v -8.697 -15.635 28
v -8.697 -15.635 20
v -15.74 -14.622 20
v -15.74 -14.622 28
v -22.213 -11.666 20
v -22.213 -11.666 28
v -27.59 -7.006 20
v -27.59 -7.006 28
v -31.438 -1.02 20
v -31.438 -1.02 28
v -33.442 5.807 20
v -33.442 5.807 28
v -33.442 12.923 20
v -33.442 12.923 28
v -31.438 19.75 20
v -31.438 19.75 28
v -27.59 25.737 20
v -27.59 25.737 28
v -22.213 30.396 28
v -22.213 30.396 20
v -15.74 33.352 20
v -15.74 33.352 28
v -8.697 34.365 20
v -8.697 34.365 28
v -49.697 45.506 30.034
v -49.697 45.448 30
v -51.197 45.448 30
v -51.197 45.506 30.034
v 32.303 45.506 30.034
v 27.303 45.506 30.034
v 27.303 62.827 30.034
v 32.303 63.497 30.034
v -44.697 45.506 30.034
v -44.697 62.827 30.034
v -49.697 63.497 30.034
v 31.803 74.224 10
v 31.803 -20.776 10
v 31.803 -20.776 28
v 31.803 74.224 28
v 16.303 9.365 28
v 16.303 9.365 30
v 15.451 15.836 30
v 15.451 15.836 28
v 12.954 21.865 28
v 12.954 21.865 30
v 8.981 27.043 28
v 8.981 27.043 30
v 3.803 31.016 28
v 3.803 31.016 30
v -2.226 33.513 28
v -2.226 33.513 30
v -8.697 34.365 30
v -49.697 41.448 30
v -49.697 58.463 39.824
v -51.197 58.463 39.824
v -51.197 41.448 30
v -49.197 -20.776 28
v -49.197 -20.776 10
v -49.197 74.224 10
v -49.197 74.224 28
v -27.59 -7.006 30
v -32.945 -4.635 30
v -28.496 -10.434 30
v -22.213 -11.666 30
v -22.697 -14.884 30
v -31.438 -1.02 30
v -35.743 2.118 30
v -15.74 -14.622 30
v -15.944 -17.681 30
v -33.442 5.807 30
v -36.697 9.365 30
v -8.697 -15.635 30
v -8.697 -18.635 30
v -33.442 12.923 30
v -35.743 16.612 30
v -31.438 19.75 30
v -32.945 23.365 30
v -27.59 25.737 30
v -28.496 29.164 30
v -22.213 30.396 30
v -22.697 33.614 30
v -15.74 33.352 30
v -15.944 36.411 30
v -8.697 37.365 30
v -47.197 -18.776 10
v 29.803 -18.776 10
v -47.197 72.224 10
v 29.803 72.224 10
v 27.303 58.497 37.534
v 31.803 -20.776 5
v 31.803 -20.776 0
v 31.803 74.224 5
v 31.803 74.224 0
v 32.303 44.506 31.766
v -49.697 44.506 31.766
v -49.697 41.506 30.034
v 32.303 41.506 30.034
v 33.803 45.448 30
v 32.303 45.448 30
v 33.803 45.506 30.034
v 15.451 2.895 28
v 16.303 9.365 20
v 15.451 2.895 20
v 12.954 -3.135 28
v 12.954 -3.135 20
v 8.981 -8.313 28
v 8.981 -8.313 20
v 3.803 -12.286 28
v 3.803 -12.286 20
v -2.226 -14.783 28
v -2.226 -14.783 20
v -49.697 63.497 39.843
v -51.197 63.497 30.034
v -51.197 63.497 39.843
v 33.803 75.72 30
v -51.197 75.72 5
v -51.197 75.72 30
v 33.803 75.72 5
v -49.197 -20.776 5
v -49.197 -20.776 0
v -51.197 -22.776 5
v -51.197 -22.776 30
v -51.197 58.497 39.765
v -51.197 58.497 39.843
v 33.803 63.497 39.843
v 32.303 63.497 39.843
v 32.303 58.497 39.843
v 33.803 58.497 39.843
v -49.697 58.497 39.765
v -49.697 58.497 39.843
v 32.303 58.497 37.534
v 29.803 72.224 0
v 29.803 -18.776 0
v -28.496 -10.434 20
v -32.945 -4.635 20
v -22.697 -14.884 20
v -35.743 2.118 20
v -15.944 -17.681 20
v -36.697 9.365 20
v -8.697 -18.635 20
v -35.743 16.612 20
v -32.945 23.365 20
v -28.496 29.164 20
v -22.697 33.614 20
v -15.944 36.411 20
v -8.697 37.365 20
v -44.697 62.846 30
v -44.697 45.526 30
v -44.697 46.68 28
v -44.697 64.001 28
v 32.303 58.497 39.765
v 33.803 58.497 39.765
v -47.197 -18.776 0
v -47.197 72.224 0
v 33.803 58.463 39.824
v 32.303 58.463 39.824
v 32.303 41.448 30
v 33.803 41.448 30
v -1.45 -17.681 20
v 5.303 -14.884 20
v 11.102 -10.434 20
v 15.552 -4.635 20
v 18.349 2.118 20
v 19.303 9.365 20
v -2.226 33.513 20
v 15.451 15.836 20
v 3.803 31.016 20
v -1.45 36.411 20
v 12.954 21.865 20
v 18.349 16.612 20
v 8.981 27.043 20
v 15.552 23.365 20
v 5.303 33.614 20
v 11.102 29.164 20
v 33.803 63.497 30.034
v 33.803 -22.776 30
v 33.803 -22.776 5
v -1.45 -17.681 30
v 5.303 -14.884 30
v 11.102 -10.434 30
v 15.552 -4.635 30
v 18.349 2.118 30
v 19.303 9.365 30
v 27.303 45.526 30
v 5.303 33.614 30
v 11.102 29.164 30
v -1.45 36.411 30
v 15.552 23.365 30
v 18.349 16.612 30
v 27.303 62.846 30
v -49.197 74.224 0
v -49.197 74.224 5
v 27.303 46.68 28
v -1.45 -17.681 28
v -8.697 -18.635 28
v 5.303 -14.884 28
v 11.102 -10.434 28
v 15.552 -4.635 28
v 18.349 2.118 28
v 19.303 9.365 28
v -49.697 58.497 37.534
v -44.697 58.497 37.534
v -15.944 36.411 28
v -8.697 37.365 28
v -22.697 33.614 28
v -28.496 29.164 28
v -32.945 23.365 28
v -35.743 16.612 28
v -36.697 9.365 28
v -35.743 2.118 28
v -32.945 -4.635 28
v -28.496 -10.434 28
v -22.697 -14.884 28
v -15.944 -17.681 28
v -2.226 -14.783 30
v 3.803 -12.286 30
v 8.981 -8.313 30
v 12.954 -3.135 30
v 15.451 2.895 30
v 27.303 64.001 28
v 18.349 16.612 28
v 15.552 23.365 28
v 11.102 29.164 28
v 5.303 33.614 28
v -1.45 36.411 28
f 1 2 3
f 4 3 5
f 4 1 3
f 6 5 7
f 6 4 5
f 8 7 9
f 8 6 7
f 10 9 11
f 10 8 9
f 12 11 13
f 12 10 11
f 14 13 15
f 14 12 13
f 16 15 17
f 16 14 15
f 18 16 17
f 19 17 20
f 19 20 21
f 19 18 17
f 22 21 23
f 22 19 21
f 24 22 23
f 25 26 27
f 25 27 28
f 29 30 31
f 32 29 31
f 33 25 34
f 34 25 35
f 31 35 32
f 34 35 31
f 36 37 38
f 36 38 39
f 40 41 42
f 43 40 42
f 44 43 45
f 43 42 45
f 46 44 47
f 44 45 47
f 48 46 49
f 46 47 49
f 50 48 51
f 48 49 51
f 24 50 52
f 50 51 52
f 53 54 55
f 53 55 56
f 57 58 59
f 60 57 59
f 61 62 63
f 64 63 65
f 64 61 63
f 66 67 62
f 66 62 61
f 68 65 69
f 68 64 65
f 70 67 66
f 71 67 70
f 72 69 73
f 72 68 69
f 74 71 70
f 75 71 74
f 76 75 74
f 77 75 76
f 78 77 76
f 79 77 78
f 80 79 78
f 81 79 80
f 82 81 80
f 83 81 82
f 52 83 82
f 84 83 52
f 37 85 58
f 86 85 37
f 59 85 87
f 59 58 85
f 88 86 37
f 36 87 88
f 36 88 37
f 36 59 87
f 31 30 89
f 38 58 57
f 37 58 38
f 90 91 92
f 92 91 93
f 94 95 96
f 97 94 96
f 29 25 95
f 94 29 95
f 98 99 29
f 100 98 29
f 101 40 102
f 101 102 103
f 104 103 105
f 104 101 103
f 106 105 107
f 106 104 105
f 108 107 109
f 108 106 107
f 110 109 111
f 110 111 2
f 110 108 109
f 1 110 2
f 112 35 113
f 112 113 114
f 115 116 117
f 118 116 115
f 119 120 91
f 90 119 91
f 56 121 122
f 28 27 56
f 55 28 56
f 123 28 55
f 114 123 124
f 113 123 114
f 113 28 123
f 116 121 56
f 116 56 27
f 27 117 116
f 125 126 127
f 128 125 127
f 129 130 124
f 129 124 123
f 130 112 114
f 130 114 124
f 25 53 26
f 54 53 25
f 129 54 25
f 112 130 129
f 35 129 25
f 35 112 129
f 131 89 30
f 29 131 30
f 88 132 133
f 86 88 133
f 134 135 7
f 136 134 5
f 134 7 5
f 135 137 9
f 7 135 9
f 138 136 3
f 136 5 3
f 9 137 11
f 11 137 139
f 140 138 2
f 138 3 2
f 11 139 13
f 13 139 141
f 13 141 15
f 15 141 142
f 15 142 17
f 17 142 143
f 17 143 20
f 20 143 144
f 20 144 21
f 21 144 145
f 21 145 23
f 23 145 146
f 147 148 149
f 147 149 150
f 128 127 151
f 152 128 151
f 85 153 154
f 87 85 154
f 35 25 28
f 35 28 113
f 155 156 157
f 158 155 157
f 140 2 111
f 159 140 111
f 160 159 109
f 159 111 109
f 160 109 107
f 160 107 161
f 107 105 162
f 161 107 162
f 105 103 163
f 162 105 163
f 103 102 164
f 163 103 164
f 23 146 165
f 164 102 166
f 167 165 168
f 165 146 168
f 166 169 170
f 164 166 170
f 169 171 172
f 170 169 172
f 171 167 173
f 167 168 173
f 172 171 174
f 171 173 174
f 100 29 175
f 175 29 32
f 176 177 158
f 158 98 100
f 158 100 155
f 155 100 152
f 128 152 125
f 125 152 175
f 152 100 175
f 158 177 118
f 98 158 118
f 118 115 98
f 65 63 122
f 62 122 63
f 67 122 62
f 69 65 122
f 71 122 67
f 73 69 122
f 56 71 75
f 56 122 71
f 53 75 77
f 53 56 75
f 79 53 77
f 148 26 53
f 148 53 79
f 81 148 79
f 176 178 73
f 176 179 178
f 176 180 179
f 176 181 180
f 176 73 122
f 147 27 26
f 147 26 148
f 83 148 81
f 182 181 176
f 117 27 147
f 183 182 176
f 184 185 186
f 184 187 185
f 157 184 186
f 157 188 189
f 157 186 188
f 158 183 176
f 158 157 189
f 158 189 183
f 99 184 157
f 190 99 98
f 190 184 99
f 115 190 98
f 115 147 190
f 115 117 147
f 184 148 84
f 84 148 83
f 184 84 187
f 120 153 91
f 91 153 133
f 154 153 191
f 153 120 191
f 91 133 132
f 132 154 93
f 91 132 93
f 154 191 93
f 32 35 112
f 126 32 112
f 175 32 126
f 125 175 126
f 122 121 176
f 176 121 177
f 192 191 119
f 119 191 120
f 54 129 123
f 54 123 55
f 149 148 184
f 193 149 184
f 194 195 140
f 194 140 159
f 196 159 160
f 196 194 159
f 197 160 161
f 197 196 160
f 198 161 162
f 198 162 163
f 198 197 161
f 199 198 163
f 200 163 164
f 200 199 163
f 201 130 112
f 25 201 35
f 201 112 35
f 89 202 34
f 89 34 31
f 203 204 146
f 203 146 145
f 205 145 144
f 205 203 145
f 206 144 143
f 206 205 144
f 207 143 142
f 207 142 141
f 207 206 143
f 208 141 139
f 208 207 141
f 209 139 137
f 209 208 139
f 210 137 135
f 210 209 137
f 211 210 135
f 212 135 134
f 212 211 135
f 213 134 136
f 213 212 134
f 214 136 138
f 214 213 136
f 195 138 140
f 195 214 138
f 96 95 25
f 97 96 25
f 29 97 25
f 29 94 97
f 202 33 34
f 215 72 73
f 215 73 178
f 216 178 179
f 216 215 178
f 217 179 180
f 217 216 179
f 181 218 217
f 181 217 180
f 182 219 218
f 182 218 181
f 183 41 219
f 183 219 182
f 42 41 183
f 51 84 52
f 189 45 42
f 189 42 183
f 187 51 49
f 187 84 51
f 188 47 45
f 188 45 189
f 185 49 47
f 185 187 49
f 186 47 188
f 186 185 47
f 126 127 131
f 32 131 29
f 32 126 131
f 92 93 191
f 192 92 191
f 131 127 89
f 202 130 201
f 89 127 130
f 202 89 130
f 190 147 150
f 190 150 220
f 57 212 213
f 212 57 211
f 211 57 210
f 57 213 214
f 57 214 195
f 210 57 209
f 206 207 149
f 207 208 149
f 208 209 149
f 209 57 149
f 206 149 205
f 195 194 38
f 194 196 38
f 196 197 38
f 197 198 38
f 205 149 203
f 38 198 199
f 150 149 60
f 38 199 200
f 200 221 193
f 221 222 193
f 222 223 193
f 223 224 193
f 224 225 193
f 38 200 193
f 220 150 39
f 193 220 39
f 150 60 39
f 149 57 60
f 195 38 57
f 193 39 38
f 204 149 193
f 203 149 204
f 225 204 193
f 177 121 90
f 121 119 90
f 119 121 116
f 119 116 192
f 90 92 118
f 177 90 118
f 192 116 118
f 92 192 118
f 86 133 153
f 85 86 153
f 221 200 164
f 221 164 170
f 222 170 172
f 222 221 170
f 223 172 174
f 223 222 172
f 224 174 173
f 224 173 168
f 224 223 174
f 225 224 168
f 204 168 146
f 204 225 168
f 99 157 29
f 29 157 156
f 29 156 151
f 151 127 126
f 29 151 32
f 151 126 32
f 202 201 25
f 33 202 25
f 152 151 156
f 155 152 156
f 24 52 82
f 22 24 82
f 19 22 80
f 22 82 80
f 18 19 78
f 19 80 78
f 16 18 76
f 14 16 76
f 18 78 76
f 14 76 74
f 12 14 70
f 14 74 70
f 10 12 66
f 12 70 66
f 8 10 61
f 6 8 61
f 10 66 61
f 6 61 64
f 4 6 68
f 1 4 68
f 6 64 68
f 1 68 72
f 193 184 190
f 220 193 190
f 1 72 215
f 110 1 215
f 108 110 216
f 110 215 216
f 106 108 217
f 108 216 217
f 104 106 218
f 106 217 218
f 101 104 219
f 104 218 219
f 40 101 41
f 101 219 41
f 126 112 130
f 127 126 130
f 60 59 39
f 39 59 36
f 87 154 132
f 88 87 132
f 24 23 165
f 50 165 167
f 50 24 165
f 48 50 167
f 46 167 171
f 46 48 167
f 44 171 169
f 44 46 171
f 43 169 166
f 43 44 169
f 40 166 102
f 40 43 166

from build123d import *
from build123d.topology import SkipClean

# Parameters (mm, degrees)
SKETCH1_W                  = 2
SKETCH1_H                  = 2
BOSS_EXTRUDE1_DEPTH        = 10
BOSS_EXTRUDE3_DEPTH        = 20
BOSS_EXTRUDE3_DEPTH_BACK   = 5
SKETCH2_W                  = 85
SKETCH2_H                  = 98.49643328
SKETCH2_W_2                = 81
SKETCH2_H_2                = 95
SKETCH3_W                  = 81
SKETCH3_H                  = 95
BOSS_EXTRUDE4_DEPTH        = 2
BOSS_EXTRUDE6_DEPTH        = 41
BOSS_EXTRUDE6_DEPTH_BACK   = 41
BOSS_EXTRUDE6_2_DEPTH      = 41
BOSS_EXTRUDE6_2_DEPTH_BACK = 41
BOSS_EXTRUDE7_DEPTH        = 1.5
SKETCH15_W                 = 72
SKETCH15_H                 = 15
CUT_EXTRUDE2_DEPTH         = 15
CUT_EXTRUDE3_DEPTH         = 10
BOSS_EXTRUDE8_DEPTH        = 10


# Read off the part's stored shape, not the designer's step: Boss-Extrude7
with BuildPart() as part:
    # Sketch1 → Boss-Extrude1 (new body)
    with BuildSketch(Plane.XY):
        Polygon((-49.196743418, -18.776119502), (-47.196743418, -18.776119502), (-47.196743418, 72.223880498), (-24.196743418, 72.223880498), (-22.196743418, 72.223880498), (29.803256582, 72.223880498), (29.803256582, 74.223880498), (-49.196743418, 74.223880498), align=None)
        Polygon((-24.196743418, -18.776119502), (-47.196743418, -18.776119502), (-47.196743418, -20.776119502), (31.803256582, -20.776119502), (31.803256582, 72.223880498), (29.803256582, 72.223880498), (29.803256582, -18.776119502), (-22.196743418, -18.776119502), align=None)
        with Locations((-48.196743418, -19.776119502)):
            Rectangle(SKETCH1_W, SKETCH1_H)
        with Locations((30.803256582, 73.223880498)):
            Rectangle(SKETCH1_W, SKETCH1_H)
    extrude(amount=BOSS_EXTRUDE1_DEPTH)

    # Sketch2 → Boss-Extrude3 (add, two sides: drawn at the far end of the back side and taken through both)
    with BuildSketch(Plane.XY.offset(10).offset(-BOSS_EXTRUDE3_DEPTH_BACK)):
        with Locations((-8.696743418, 26.472097138)):
            Rectangle(SKETCH2_W, SKETCH2_H)
        with Locations((-8.696743418, 26.723880498)):
            Rectangle(SKETCH2_W_2, SKETCH2_H_2, mode=Mode.SUBTRACT)
    extrude(amount=BOSS_EXTRUDE3_DEPTH + BOSS_EXTRUDE3_DEPTH_BACK)

    # Sketch3 → Boss-Extrude4 (add)
    with BuildSketch(Plane.XY.offset(30)):
        with Locations((-8.696743418, 26.723880498)):
            Rectangle(SKETCH3_W, SKETCH3_H)
    extrude(amount=-BOSS_EXTRUDE4_DEPTH)

    # Boss-Extrude7 outline → Boss-Extrude7 (add)
    with BuildSketch(Plane(origin=(32.303256582, 0, 0), x_dir=(0, 0, -1), z_dir=(1, 0, 0))):
        Polygon((-39.842927076, 63.496736875), (-39.842927076, 58.496736875), (-39.765386314, 58.496736875), (-39.823541886, 58.46316074), (-30, 41.448287084), (-30, 45.448287084), (-30.033525999, 45.506355818), (-30.033525999, 63.496736875), align=None)
    boss_extrude7 = extrude(amount=BOSS_EXTRUDE7_DEPTH)

    # Mirror2: Boss-Extrude7 across plane
    add(boss_extrude7.mirror(Plane(origin=(-8.696743418, 0, 0), x_dir=(0, 0, 1), z_dir=(1, 0, 0))))


with BuildPart() as body_2:
    # Sketch9 → Boss-Extrude6 (new, two sides: drawn at the far end of the back side and taken through both)
    with BuildSketch(Plane(origin=(-8.696743418, 0, 0), x_dir=(0, 0, -1), z_dir=(1, 0, 0)).offset(-BOSS_EXTRUDE6_DEPTH_BACK)):
        Polygon((-30.033525999, 45.506355818), (-30.033525999, 63.496736875), (-39.842927076, 63.496736875), (-39.842927076, 58.496736875), (-37.533525999, 58.496736875), align=None)
    extrude(amount=BOSS_EXTRUDE6_DEPTH + BOSS_EXTRUDE6_DEPTH_BACK)


with BuildPart() as body_3:
    # Sketch9 → Boss-Extrude6 2 (new, two sides: drawn at the far end of the back side and taken through both)
    with BuildSketch(Plane(origin=(-8.696743418, 0, 0), x_dir=(0, 0, -1), z_dir=(1, 0, 0)).offset(-BOSS_EXTRUDE6_2_DEPTH_BACK)):
        Polygon((-30.033525999, 41.506355818), (-30.033525999, 45.506355818), (-31.765576807, 44.506355818), align=None)
    extrude(amount=BOSS_EXTRUDE6_2_DEPTH + BOSS_EXTRUDE6_2_DEPTH_BACK)


with BuildPart() as cut_extrude2_tool:
    # Sketch15 → Cut-Extrude2 (new body)
    with BuildSketch(Plane(origin=(0, -1.628309286, 2.820314413), x_dir=(1, 0, 0), z_dir=(0, -0.5000000000000001, 0.8660254037844386))):
        with Locations((-8.696743418, 61.926423172)):
            Rectangle(SKETCH15_W, SKETCH15_H)
    extrude(amount=-CUT_EXTRUDE2_DEPTH)


with BuildPart() as part_1:
    add(part.part)

    # Cut-Extrude2: cut by cut_extrude2_tool
    add(cut_extrude2_tool.part, mode=Mode.SUBTRACT)

    # Sketch16 → Cut-Extrude3 (cut)
    with BuildSketch(Plane.XY.offset(30)):
        with BuildLine():
            ThreePointArc((-8.696743418, 34.365118158), (-33.696743418, 9.365118158), (-8.696743418, -15.634881842))
            Line((-8.696743418, -15.634881842), (-8.696743418, 34.365118158))
        make_face()
        with BuildLine():
            Line((-8.696743418, 34.365118158), (-8.696743418, -15.634881842))
            ThreePointArc((-8.696743418, -15.634881842), (8.980926112, -8.312551372), (16.303256582, 9.365118158))
            ThreePointArc((16.303256582, 9.365118158), (8.980926112, 27.042787688), (-8.696743418, 34.365118158))
        make_face()
    extrude(amount=-CUT_EXTRUDE3_DEPTH, mode=Mode.SUBTRACT)

    # Sketch16<3> → Boss-Extrude8 (add)
    with SkipClean():  # the faces are left unmerged after this step: merging them gives an invalid solid
        with BuildSketch(Plane.XY.offset(30)):
            with BuildLine():
                ThreePointArc((-8.696743418, 37.365118158), (-36.696743418, 9.365118158), (-8.696743418, -18.634881842))
                Line((-8.696743418, -18.634881842), (-8.696743418, -15.634881842))
                ThreePointArc((-8.696743418, -15.634881842), (-33.696743418, 9.365118158), (-8.696743418, 34.365118158))
                Line((-8.696743418, 34.365118158), (-8.696743418, 37.365118158))
            make_face()
            with BuildLine():
                Line((-8.696743418, -15.634881842), (-8.696743418, -18.634881842))
                ThreePointArc((-8.696743418, -18.634881842), (11.102246456, -10.433871715), (19.303256582, 9.365118158))
                ThreePointArc((19.303256582, 9.365118158), (11.102246456, 29.164108031), (-8.696743418, 37.365118158))
                Line((-8.696743418, 37.365118158), (-8.696743418, 34.365118158))
                ThreePointArc((-8.696743418, 34.365118158), (8.980926112, 27.042787688), (16.303256582, 9.365118158))
                ThreePointArc((16.303256582, 9.365118158), (8.980926112, -8.312551372), (-8.696743418, -15.634881842))
            make_face()
        extrude(amount=-BOSS_EXTRUDE8_DEPTH)


with BuildPart() as body_2_1:
    add(body_2.part)

    # Cut-Extrude2: cut by cut_extrude2_tool
    add(cut_extrude2_tool.part, mode=Mode.SUBTRACT)


solid = Compound([body_3.part, part_1.part, body_2_1.part])
